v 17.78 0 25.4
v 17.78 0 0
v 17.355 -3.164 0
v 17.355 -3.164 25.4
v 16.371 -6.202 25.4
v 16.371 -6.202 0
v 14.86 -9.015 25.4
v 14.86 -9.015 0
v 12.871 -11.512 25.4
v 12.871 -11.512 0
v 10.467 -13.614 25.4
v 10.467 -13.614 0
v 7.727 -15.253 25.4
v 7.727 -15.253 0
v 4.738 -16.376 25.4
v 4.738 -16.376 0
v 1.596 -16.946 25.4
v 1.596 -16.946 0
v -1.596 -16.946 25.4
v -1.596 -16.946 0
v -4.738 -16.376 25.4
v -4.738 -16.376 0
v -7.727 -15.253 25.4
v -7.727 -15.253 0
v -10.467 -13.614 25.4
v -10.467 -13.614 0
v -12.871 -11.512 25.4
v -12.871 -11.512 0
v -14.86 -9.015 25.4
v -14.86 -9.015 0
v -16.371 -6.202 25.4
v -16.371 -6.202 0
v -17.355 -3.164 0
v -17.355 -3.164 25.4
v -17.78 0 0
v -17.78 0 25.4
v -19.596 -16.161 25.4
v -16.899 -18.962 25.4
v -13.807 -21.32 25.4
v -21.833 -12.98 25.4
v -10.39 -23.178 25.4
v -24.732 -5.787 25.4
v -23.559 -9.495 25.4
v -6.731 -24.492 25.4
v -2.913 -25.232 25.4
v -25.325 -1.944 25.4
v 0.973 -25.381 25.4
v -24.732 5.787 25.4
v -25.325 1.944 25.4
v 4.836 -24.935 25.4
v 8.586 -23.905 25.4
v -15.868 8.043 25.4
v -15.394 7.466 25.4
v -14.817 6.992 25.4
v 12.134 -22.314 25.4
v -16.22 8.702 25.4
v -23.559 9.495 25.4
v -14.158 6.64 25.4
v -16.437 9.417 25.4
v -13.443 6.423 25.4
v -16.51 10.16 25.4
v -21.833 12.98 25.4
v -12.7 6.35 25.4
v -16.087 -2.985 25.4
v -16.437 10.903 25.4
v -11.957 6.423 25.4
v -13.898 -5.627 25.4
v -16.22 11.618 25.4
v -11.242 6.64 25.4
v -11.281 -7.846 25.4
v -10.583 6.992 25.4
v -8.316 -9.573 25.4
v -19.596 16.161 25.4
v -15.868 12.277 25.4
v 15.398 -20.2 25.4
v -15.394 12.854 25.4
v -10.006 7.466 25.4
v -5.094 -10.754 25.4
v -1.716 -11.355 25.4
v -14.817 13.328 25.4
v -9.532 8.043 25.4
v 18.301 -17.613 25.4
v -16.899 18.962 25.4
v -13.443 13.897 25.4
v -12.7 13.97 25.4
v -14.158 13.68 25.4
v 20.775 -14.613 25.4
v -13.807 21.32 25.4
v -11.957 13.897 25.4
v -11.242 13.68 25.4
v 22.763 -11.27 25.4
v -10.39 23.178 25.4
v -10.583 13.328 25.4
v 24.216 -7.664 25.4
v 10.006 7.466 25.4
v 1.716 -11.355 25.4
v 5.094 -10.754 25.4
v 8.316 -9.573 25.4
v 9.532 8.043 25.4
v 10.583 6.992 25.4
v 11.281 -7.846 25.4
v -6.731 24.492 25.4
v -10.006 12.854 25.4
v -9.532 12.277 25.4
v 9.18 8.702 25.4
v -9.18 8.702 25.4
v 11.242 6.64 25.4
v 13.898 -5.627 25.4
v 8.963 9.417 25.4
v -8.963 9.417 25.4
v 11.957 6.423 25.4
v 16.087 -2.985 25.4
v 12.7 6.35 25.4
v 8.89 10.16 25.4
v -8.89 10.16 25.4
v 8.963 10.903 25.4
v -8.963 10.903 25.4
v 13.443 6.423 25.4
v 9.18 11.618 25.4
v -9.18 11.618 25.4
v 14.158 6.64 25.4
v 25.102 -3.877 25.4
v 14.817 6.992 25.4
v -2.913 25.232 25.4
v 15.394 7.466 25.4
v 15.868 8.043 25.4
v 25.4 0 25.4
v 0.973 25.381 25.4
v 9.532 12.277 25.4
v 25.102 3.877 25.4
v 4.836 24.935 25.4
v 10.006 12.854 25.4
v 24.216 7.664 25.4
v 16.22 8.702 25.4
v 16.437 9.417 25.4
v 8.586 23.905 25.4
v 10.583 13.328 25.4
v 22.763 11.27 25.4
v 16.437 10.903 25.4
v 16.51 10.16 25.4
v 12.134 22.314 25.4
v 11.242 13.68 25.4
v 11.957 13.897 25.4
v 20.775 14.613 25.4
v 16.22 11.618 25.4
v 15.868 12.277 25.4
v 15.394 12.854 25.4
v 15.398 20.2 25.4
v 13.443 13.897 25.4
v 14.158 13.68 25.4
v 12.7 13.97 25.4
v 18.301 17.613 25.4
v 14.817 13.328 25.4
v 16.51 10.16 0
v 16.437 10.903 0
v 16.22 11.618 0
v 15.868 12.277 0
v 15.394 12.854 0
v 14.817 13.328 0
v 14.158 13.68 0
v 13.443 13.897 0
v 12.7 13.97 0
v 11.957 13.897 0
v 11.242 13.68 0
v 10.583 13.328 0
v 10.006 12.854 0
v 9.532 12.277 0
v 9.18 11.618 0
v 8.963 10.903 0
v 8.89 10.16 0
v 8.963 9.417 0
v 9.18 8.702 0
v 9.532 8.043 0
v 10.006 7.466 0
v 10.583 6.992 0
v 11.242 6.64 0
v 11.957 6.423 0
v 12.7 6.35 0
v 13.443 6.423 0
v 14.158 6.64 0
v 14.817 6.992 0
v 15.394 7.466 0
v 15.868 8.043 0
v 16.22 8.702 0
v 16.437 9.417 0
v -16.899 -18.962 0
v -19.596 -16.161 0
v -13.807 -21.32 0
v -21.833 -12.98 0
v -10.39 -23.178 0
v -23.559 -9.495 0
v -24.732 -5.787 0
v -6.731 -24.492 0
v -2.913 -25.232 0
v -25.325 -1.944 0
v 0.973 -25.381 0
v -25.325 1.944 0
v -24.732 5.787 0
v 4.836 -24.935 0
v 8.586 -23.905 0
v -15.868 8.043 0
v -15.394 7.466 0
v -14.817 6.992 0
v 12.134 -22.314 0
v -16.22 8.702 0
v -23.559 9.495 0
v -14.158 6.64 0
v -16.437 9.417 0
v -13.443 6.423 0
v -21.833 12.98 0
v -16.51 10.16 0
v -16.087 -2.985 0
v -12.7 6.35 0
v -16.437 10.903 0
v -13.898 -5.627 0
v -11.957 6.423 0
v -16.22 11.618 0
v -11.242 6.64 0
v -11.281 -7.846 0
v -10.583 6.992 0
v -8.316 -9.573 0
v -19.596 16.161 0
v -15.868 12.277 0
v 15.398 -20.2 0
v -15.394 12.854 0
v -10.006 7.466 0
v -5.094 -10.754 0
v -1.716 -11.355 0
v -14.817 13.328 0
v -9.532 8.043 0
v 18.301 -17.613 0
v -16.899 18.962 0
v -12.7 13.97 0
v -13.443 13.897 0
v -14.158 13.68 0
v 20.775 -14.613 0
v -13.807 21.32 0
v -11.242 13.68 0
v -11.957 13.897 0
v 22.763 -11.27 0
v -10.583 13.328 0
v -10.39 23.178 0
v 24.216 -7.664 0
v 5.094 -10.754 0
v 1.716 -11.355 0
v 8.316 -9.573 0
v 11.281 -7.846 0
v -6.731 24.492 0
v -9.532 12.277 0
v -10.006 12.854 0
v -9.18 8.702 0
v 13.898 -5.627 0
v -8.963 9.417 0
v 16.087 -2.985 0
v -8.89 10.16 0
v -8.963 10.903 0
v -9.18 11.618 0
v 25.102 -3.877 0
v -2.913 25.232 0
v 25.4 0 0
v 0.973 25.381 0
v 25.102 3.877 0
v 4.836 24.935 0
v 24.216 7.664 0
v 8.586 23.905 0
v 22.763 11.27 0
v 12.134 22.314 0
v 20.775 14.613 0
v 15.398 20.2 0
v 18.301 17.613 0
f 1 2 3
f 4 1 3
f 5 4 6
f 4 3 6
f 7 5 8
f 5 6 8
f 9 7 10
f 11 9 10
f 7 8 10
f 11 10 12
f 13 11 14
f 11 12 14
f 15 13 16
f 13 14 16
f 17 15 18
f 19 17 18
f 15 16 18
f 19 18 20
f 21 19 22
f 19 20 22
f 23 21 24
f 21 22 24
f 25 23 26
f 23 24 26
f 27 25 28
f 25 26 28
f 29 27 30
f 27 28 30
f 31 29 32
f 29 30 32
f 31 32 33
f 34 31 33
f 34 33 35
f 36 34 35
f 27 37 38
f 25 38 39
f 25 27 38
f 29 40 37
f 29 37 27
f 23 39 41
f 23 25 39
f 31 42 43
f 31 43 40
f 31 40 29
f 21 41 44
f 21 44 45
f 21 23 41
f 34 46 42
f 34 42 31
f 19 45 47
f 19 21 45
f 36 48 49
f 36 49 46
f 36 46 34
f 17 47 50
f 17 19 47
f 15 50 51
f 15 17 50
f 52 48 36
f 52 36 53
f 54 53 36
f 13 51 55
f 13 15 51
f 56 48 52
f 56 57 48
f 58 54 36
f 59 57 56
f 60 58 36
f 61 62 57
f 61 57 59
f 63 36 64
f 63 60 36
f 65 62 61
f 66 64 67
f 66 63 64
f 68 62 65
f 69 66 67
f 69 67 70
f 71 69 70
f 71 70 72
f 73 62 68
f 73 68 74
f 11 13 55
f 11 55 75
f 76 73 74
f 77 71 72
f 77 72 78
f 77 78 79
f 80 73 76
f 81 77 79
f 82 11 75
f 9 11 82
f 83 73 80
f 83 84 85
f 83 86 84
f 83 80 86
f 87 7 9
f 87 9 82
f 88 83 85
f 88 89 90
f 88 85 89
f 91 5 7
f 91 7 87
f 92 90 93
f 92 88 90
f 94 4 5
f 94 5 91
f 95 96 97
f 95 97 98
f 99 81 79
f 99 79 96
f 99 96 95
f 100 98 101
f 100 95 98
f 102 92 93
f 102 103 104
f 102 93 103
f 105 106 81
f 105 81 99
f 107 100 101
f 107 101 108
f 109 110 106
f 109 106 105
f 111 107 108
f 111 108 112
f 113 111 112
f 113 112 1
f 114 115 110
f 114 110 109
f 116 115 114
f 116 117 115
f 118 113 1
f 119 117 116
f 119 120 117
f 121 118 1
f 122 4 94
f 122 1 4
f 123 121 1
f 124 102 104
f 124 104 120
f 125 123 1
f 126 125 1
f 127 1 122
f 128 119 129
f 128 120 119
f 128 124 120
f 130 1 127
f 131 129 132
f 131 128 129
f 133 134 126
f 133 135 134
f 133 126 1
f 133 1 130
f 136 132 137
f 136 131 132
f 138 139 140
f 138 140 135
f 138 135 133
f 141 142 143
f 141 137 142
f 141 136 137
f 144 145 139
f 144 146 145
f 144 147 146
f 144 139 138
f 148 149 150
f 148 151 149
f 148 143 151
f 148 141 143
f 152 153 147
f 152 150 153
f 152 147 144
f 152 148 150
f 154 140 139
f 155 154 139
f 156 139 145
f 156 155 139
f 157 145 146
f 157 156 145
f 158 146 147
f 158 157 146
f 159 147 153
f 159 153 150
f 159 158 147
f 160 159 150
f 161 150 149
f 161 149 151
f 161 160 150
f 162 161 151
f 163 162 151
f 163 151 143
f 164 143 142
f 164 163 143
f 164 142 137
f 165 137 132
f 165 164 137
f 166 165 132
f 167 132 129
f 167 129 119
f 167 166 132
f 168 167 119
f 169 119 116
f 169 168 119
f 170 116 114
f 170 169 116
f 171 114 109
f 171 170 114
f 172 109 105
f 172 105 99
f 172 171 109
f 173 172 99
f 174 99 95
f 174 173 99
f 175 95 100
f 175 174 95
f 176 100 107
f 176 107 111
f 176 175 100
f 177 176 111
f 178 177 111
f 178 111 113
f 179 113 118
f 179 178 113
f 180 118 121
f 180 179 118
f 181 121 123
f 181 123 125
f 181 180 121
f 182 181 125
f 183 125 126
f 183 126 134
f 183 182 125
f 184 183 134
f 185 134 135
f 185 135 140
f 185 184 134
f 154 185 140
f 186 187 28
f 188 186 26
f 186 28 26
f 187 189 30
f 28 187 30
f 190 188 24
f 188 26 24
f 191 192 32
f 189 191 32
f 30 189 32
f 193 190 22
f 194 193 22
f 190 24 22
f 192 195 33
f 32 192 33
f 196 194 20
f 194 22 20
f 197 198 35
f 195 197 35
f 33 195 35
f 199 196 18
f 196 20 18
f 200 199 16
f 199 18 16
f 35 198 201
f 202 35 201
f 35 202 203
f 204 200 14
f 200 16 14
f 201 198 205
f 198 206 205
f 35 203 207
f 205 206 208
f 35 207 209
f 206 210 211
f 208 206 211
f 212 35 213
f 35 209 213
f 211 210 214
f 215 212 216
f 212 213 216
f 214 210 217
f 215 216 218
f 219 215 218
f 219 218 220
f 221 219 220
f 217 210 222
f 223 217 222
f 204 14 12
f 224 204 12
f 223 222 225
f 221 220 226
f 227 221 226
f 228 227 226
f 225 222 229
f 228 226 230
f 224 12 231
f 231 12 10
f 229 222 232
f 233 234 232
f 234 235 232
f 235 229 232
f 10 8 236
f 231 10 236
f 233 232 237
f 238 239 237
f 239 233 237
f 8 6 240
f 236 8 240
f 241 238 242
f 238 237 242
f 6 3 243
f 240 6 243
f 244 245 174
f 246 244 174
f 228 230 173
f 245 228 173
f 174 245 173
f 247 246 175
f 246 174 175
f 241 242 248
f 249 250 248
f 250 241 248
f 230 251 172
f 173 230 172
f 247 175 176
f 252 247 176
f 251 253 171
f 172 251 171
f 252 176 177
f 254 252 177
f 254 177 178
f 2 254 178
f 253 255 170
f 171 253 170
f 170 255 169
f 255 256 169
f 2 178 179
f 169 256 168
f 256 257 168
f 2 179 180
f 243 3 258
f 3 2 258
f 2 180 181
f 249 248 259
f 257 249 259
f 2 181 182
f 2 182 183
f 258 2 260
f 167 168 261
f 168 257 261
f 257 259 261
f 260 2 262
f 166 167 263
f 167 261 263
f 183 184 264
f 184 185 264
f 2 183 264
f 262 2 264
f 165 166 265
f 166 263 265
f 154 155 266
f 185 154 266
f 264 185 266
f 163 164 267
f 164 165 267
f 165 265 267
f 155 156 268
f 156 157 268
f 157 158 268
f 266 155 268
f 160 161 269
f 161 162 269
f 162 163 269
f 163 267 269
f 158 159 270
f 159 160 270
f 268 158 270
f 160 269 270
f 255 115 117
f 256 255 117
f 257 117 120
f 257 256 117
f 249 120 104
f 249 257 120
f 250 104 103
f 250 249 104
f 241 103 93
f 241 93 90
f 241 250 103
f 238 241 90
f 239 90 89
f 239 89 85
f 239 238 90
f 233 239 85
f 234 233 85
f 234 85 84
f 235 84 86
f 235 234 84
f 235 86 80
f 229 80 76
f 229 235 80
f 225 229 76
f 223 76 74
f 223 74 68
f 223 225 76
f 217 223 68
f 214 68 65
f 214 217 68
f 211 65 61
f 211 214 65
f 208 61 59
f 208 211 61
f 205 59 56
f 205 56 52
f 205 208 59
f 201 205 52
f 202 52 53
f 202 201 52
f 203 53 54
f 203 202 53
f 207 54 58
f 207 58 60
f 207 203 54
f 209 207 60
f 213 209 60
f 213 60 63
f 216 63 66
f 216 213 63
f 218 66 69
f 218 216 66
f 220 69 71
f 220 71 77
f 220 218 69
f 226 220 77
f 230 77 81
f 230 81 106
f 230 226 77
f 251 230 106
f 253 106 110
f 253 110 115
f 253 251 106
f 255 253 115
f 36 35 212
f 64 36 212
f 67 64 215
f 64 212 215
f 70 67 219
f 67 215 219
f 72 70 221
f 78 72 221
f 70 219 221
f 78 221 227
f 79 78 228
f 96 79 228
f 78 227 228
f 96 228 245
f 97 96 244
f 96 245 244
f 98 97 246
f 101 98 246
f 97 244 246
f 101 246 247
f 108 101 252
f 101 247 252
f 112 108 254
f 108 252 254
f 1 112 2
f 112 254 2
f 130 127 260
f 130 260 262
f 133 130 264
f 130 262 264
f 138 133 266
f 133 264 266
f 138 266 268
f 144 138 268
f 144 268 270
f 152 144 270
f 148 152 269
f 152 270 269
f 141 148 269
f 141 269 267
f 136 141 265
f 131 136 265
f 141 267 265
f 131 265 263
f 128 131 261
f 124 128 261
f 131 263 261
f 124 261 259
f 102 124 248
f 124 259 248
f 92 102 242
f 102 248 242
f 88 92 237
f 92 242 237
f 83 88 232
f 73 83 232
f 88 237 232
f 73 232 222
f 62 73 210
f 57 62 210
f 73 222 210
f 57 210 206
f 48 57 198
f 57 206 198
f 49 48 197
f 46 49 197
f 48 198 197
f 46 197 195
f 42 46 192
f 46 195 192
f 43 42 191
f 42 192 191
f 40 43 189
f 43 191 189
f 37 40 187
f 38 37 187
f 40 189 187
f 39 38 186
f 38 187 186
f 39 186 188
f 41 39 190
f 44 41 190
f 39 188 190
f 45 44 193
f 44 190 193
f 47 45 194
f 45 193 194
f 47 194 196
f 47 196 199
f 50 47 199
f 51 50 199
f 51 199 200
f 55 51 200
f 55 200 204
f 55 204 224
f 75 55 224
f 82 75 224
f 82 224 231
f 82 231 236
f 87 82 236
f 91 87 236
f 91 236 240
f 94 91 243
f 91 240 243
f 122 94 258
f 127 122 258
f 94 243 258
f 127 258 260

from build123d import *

# Parameters (mm, degrees)
F0_R     = 25.4
F0_R_2   = 3.81
F1_DEPTH = 25.4


with BuildPart() as f1:
    # F0 (on Top) → F1 (new body)
    with BuildSketch(Plane.XY):
        Circle(F0_R)
        with BuildLine():
            ThreePointArc((17.78, 0), (0, -17.018), (-17.78, 0))
            ThreePointArc((-17.78, 0), (0, -11.43), (17.78, 0))
        make_face(mode=Mode.SUBTRACT)
        with Locations((-12.7, 10.16)):
            Circle(F0_R_2, mode=Mode.SUBTRACT)
        with Locations((12.7, 10.16)):
            Circle(F0_R_2, mode=Mode.SUBTRACT)
    extrude(amount=F1_DEPTH)


solid = f1.part
